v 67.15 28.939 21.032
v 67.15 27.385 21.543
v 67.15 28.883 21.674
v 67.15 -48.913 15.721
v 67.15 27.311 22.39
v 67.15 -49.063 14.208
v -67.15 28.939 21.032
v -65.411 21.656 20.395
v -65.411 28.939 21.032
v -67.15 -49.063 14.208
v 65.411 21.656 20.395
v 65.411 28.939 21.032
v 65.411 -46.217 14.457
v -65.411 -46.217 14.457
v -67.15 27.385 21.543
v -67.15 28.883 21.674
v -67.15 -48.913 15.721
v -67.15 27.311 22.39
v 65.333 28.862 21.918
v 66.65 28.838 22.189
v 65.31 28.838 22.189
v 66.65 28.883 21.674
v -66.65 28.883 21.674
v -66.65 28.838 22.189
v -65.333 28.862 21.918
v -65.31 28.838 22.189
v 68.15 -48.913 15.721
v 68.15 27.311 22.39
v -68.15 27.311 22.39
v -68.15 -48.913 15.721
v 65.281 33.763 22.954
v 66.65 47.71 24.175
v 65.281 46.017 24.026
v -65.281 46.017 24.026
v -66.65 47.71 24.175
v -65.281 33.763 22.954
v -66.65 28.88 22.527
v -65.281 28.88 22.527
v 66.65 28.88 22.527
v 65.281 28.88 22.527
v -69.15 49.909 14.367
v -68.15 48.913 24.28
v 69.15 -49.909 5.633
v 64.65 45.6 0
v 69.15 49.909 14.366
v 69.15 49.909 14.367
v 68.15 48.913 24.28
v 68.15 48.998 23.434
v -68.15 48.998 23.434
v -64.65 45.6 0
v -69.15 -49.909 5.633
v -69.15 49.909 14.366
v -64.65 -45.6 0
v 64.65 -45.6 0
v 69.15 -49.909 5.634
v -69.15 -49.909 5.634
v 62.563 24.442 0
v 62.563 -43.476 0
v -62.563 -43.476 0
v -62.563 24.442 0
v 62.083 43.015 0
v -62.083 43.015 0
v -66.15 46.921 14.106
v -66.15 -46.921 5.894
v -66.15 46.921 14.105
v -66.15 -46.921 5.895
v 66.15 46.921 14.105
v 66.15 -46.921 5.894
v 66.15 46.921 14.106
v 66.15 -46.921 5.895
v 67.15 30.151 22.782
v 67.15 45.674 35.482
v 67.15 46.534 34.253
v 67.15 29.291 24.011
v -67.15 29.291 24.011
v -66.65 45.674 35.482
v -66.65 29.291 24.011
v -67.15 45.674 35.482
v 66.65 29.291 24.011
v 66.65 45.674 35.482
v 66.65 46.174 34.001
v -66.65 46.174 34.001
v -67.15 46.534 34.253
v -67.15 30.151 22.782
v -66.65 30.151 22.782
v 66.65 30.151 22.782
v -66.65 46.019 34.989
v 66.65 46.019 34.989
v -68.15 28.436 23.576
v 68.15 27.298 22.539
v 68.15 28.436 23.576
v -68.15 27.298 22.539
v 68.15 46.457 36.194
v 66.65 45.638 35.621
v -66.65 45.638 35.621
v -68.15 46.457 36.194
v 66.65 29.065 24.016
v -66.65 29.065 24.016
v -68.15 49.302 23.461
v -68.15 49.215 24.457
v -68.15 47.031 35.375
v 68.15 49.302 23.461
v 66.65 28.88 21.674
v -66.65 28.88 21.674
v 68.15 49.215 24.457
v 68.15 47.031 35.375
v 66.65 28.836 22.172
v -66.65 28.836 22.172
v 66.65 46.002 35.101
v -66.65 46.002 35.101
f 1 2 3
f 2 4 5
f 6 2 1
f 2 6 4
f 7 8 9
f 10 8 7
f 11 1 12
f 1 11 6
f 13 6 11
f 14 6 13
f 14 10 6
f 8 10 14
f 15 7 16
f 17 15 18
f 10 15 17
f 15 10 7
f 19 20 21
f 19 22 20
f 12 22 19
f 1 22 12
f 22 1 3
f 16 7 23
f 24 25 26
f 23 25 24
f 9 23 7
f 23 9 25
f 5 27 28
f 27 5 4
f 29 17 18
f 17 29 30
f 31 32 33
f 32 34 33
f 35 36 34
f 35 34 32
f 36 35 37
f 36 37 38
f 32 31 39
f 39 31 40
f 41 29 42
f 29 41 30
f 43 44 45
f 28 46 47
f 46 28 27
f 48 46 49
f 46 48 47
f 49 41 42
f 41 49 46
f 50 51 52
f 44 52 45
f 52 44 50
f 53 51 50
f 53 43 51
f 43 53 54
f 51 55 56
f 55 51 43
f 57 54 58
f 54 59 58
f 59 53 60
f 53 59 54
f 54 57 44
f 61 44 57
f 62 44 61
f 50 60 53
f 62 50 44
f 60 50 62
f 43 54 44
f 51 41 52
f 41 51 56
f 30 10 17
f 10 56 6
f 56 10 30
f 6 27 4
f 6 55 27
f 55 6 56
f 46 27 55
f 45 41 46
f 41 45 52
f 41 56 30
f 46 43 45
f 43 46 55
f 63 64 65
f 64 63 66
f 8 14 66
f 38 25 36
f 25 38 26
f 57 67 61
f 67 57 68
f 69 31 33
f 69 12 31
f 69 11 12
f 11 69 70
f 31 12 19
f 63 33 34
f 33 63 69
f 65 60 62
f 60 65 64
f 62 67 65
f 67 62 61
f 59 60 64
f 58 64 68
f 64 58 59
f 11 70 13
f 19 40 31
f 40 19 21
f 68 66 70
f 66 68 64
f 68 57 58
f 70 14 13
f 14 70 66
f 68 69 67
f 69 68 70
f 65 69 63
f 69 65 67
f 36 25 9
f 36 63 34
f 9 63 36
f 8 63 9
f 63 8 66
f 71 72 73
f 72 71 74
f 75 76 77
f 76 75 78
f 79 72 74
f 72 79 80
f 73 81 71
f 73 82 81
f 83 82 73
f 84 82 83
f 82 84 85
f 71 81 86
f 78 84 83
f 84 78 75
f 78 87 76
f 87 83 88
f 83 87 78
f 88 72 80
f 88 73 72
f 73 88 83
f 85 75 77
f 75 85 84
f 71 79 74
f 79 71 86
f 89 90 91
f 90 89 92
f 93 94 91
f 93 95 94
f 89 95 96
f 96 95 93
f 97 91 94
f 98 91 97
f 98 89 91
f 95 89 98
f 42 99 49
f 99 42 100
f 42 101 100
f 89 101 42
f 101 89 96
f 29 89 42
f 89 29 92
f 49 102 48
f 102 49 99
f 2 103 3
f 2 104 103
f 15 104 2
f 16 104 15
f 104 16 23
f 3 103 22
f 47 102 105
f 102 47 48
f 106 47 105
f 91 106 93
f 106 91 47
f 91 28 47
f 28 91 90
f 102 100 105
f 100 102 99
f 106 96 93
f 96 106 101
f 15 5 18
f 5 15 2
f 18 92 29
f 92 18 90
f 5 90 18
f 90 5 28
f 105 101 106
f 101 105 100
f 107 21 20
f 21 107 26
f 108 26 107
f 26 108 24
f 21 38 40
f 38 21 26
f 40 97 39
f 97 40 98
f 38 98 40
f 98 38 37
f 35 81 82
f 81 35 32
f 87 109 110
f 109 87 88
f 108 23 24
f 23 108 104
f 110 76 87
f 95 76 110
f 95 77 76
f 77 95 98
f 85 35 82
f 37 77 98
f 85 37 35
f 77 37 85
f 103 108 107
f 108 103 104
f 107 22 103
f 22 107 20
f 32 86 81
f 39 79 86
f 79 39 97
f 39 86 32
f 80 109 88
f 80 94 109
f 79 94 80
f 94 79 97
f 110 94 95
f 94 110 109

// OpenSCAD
keyholeWidth            = 14.00;
gapBetweenSwitches      = 5.05;
matrixLength            = 5; //y axis
matrixWidth             = 7; //x axis
borderAroundEdge        = 3;
switchPlateDepth        = 1.5;
angledNumberLayer       = true;
//this the matrix width with the keyholes, gaps, and border.
matrixWidthGapsBorder   = matrixWidth*keyholeWidth + (matrixWidth-1)*gapBetweenSwitches + borderAroundEdge*2; 
matrixLengthGapsBorder  = matrixLength*keyholeWidth +(matrixLength-1)*gapBetweenSwitches + borderAroundEdge*2;
lowerFrameX             = matrixWidthGapsBorder-5; //controls the tapering of the general case
lowerFrameY             = matrixLengthGapsBorder-5;
lowerFrameHeight        = 0.001;
middleFrameX            = matrixWidthGapsBorder+4;
middleFrameY            = matrixLengthGapsBorder+4;
middleFrameHeight       = 0.001;
upperFrameX             = matrixWidthGapsBorder+2;
upperFrameY             = matrixLengthGapsBorder+2;
upperFrameHeight        = 0.001;

angledNumberLayerWidth  = keyholeWidth + borderAroundEdge*2 +2;
angledNumberLayerLength = upperFrameX;



module buildKeyHole() {
  translate([0,0,-0.1]) // this is because you can't have 0 width when doing difference
  cube([keyholeWidth,keyholeWidth,switchPlateDepth+0.2]);
};

module buildSwitchPlate(numberOfKeysWidth=matrixWidth,numberOfKeysLength=matrixLength) {
    width = numberOfKeysWidth*keyholeWidth + (numberOfKeysWidth-1)*gapBetweenSwitches + borderAroundEdge*2;
    length = numberOfKeysLength*keyholeWidth +(numberOfKeysLength-1)*gapBetweenSwitches + borderAroundEdge*2;
    
    if (angledNumberLayer){ 
        translate([-width/2,-length/2 - (keyholeWidth+gapBetweenSwitches),0]); 

        }
    else {
        translate([-width/2,-length/2,0]);
        };
    
    translate([-width/2,-length/2 - (keyholeWidth+gapBetweenSwitches),0])
    
    difference() {
        cube([
            width ,
            length,
            switchPlateDepth
        ]);
        
        for(x = [1:matrixWidth]) {
            for(y = [1:matrixLength]) {
                translate([
                    borderAroundEdge + (x-1)*keyholeWidth + (x-1)*gapBetweenSwitches,
                    borderAroundEdge + (y-1)*keyholeWidth + (y-1)*gapBetweenSwitches,
                    0]) 
                buildKeyHole();
            };
        };
    };
};


//The buildGeneralCase uses a hull on three rectangular frames (lower, middle, upper).

module buildNumberLayerAngled() {
    angle = 30;
    recess = 3;
    secondpanelupwards = 6.5;
  
    difference() {
        hull() {
            buildRectangularFrame(x=angledNumberLayerLength,y=angledNumberLayerWidth,z=1);
            translate([0,0,secondpanelupwards]) rotate([angle,0,0]) buildRectangularFrame(x=angledNumberLayerLength,y=angledNumberLayerWidth,z=1);
        };
        hull() {
            translate([0,0,-1]) buildRectangularFrame(x=angledNumberLayerLength-recess,y=angledNumberLayerWidth-recess,z=2);
            translate([0,0,secondpanelupwards+1]) rotate([angle,0,0]) 
                buildRectangularFrame(x=angledNumberLayerLength-recess,y=angledNumberLayerWidth-recess,z=2);
               
        };

        translate([0,0,secondpanelupwards+1]) rotate([angle,0,0]) translate([0,18.5,-2]) buildSwitchPlate(numberOfKeysLength=1);

    };


};
module buildRectangularFrame(x=0,y=0,z=0) {
    cube([
            x,
            y,
            z,
    ], center=true);
};



module buildGeneralCase() {
    angle = 5;
    recess = 6;
    lip = 2.5;
    difference() {
        difference() {
            hull() {
                translate([0,0,0]) buildRectangularFrame(lowerFrameX,lowerFrameY,lowerFrameHeight);
                translate([0,0,10]) rotate([angle,0,0]) buildRectangularFrame(middleFrameX,middleFrameY,middleFrameHeight);
                translate([0,0,20]) rotate([angle,0,0]) buildRectangularFrame(upperFrameX,upperFrameY,upperFrameHeight);
            };
        translate([0,0,20-switchPlateDepth]) rotate([angle,0,0]) buildSwitchPlate();
    };
        hull() {
            translate([0,0,0-1])                    buildRectangularFrame(lowerFrameX-recess,lowerFrameY-recess,lowerFrameHeight+1);
            translate([0,0,10]) rotate([angle,0,0])     buildRectangularFrame(middleFrameX-recess,middleFrameY-recess,middleFrameHeight);
            translate([0,0,20+1]) rotate([angle,0,0])   buildRectangularFrame(upperFrameX-recess,upperFrameY-recess,upperFrameHeight+1);
        };
    };
    translate([0,38.3,23]) rotate([angle,0,0]) buildNumberLayerAngled();

    
};





*buildNumberLayerAngled();

buildGeneralCase();
*buildSwitchPlate(numberOfKeysLength=matrixLength-1);
